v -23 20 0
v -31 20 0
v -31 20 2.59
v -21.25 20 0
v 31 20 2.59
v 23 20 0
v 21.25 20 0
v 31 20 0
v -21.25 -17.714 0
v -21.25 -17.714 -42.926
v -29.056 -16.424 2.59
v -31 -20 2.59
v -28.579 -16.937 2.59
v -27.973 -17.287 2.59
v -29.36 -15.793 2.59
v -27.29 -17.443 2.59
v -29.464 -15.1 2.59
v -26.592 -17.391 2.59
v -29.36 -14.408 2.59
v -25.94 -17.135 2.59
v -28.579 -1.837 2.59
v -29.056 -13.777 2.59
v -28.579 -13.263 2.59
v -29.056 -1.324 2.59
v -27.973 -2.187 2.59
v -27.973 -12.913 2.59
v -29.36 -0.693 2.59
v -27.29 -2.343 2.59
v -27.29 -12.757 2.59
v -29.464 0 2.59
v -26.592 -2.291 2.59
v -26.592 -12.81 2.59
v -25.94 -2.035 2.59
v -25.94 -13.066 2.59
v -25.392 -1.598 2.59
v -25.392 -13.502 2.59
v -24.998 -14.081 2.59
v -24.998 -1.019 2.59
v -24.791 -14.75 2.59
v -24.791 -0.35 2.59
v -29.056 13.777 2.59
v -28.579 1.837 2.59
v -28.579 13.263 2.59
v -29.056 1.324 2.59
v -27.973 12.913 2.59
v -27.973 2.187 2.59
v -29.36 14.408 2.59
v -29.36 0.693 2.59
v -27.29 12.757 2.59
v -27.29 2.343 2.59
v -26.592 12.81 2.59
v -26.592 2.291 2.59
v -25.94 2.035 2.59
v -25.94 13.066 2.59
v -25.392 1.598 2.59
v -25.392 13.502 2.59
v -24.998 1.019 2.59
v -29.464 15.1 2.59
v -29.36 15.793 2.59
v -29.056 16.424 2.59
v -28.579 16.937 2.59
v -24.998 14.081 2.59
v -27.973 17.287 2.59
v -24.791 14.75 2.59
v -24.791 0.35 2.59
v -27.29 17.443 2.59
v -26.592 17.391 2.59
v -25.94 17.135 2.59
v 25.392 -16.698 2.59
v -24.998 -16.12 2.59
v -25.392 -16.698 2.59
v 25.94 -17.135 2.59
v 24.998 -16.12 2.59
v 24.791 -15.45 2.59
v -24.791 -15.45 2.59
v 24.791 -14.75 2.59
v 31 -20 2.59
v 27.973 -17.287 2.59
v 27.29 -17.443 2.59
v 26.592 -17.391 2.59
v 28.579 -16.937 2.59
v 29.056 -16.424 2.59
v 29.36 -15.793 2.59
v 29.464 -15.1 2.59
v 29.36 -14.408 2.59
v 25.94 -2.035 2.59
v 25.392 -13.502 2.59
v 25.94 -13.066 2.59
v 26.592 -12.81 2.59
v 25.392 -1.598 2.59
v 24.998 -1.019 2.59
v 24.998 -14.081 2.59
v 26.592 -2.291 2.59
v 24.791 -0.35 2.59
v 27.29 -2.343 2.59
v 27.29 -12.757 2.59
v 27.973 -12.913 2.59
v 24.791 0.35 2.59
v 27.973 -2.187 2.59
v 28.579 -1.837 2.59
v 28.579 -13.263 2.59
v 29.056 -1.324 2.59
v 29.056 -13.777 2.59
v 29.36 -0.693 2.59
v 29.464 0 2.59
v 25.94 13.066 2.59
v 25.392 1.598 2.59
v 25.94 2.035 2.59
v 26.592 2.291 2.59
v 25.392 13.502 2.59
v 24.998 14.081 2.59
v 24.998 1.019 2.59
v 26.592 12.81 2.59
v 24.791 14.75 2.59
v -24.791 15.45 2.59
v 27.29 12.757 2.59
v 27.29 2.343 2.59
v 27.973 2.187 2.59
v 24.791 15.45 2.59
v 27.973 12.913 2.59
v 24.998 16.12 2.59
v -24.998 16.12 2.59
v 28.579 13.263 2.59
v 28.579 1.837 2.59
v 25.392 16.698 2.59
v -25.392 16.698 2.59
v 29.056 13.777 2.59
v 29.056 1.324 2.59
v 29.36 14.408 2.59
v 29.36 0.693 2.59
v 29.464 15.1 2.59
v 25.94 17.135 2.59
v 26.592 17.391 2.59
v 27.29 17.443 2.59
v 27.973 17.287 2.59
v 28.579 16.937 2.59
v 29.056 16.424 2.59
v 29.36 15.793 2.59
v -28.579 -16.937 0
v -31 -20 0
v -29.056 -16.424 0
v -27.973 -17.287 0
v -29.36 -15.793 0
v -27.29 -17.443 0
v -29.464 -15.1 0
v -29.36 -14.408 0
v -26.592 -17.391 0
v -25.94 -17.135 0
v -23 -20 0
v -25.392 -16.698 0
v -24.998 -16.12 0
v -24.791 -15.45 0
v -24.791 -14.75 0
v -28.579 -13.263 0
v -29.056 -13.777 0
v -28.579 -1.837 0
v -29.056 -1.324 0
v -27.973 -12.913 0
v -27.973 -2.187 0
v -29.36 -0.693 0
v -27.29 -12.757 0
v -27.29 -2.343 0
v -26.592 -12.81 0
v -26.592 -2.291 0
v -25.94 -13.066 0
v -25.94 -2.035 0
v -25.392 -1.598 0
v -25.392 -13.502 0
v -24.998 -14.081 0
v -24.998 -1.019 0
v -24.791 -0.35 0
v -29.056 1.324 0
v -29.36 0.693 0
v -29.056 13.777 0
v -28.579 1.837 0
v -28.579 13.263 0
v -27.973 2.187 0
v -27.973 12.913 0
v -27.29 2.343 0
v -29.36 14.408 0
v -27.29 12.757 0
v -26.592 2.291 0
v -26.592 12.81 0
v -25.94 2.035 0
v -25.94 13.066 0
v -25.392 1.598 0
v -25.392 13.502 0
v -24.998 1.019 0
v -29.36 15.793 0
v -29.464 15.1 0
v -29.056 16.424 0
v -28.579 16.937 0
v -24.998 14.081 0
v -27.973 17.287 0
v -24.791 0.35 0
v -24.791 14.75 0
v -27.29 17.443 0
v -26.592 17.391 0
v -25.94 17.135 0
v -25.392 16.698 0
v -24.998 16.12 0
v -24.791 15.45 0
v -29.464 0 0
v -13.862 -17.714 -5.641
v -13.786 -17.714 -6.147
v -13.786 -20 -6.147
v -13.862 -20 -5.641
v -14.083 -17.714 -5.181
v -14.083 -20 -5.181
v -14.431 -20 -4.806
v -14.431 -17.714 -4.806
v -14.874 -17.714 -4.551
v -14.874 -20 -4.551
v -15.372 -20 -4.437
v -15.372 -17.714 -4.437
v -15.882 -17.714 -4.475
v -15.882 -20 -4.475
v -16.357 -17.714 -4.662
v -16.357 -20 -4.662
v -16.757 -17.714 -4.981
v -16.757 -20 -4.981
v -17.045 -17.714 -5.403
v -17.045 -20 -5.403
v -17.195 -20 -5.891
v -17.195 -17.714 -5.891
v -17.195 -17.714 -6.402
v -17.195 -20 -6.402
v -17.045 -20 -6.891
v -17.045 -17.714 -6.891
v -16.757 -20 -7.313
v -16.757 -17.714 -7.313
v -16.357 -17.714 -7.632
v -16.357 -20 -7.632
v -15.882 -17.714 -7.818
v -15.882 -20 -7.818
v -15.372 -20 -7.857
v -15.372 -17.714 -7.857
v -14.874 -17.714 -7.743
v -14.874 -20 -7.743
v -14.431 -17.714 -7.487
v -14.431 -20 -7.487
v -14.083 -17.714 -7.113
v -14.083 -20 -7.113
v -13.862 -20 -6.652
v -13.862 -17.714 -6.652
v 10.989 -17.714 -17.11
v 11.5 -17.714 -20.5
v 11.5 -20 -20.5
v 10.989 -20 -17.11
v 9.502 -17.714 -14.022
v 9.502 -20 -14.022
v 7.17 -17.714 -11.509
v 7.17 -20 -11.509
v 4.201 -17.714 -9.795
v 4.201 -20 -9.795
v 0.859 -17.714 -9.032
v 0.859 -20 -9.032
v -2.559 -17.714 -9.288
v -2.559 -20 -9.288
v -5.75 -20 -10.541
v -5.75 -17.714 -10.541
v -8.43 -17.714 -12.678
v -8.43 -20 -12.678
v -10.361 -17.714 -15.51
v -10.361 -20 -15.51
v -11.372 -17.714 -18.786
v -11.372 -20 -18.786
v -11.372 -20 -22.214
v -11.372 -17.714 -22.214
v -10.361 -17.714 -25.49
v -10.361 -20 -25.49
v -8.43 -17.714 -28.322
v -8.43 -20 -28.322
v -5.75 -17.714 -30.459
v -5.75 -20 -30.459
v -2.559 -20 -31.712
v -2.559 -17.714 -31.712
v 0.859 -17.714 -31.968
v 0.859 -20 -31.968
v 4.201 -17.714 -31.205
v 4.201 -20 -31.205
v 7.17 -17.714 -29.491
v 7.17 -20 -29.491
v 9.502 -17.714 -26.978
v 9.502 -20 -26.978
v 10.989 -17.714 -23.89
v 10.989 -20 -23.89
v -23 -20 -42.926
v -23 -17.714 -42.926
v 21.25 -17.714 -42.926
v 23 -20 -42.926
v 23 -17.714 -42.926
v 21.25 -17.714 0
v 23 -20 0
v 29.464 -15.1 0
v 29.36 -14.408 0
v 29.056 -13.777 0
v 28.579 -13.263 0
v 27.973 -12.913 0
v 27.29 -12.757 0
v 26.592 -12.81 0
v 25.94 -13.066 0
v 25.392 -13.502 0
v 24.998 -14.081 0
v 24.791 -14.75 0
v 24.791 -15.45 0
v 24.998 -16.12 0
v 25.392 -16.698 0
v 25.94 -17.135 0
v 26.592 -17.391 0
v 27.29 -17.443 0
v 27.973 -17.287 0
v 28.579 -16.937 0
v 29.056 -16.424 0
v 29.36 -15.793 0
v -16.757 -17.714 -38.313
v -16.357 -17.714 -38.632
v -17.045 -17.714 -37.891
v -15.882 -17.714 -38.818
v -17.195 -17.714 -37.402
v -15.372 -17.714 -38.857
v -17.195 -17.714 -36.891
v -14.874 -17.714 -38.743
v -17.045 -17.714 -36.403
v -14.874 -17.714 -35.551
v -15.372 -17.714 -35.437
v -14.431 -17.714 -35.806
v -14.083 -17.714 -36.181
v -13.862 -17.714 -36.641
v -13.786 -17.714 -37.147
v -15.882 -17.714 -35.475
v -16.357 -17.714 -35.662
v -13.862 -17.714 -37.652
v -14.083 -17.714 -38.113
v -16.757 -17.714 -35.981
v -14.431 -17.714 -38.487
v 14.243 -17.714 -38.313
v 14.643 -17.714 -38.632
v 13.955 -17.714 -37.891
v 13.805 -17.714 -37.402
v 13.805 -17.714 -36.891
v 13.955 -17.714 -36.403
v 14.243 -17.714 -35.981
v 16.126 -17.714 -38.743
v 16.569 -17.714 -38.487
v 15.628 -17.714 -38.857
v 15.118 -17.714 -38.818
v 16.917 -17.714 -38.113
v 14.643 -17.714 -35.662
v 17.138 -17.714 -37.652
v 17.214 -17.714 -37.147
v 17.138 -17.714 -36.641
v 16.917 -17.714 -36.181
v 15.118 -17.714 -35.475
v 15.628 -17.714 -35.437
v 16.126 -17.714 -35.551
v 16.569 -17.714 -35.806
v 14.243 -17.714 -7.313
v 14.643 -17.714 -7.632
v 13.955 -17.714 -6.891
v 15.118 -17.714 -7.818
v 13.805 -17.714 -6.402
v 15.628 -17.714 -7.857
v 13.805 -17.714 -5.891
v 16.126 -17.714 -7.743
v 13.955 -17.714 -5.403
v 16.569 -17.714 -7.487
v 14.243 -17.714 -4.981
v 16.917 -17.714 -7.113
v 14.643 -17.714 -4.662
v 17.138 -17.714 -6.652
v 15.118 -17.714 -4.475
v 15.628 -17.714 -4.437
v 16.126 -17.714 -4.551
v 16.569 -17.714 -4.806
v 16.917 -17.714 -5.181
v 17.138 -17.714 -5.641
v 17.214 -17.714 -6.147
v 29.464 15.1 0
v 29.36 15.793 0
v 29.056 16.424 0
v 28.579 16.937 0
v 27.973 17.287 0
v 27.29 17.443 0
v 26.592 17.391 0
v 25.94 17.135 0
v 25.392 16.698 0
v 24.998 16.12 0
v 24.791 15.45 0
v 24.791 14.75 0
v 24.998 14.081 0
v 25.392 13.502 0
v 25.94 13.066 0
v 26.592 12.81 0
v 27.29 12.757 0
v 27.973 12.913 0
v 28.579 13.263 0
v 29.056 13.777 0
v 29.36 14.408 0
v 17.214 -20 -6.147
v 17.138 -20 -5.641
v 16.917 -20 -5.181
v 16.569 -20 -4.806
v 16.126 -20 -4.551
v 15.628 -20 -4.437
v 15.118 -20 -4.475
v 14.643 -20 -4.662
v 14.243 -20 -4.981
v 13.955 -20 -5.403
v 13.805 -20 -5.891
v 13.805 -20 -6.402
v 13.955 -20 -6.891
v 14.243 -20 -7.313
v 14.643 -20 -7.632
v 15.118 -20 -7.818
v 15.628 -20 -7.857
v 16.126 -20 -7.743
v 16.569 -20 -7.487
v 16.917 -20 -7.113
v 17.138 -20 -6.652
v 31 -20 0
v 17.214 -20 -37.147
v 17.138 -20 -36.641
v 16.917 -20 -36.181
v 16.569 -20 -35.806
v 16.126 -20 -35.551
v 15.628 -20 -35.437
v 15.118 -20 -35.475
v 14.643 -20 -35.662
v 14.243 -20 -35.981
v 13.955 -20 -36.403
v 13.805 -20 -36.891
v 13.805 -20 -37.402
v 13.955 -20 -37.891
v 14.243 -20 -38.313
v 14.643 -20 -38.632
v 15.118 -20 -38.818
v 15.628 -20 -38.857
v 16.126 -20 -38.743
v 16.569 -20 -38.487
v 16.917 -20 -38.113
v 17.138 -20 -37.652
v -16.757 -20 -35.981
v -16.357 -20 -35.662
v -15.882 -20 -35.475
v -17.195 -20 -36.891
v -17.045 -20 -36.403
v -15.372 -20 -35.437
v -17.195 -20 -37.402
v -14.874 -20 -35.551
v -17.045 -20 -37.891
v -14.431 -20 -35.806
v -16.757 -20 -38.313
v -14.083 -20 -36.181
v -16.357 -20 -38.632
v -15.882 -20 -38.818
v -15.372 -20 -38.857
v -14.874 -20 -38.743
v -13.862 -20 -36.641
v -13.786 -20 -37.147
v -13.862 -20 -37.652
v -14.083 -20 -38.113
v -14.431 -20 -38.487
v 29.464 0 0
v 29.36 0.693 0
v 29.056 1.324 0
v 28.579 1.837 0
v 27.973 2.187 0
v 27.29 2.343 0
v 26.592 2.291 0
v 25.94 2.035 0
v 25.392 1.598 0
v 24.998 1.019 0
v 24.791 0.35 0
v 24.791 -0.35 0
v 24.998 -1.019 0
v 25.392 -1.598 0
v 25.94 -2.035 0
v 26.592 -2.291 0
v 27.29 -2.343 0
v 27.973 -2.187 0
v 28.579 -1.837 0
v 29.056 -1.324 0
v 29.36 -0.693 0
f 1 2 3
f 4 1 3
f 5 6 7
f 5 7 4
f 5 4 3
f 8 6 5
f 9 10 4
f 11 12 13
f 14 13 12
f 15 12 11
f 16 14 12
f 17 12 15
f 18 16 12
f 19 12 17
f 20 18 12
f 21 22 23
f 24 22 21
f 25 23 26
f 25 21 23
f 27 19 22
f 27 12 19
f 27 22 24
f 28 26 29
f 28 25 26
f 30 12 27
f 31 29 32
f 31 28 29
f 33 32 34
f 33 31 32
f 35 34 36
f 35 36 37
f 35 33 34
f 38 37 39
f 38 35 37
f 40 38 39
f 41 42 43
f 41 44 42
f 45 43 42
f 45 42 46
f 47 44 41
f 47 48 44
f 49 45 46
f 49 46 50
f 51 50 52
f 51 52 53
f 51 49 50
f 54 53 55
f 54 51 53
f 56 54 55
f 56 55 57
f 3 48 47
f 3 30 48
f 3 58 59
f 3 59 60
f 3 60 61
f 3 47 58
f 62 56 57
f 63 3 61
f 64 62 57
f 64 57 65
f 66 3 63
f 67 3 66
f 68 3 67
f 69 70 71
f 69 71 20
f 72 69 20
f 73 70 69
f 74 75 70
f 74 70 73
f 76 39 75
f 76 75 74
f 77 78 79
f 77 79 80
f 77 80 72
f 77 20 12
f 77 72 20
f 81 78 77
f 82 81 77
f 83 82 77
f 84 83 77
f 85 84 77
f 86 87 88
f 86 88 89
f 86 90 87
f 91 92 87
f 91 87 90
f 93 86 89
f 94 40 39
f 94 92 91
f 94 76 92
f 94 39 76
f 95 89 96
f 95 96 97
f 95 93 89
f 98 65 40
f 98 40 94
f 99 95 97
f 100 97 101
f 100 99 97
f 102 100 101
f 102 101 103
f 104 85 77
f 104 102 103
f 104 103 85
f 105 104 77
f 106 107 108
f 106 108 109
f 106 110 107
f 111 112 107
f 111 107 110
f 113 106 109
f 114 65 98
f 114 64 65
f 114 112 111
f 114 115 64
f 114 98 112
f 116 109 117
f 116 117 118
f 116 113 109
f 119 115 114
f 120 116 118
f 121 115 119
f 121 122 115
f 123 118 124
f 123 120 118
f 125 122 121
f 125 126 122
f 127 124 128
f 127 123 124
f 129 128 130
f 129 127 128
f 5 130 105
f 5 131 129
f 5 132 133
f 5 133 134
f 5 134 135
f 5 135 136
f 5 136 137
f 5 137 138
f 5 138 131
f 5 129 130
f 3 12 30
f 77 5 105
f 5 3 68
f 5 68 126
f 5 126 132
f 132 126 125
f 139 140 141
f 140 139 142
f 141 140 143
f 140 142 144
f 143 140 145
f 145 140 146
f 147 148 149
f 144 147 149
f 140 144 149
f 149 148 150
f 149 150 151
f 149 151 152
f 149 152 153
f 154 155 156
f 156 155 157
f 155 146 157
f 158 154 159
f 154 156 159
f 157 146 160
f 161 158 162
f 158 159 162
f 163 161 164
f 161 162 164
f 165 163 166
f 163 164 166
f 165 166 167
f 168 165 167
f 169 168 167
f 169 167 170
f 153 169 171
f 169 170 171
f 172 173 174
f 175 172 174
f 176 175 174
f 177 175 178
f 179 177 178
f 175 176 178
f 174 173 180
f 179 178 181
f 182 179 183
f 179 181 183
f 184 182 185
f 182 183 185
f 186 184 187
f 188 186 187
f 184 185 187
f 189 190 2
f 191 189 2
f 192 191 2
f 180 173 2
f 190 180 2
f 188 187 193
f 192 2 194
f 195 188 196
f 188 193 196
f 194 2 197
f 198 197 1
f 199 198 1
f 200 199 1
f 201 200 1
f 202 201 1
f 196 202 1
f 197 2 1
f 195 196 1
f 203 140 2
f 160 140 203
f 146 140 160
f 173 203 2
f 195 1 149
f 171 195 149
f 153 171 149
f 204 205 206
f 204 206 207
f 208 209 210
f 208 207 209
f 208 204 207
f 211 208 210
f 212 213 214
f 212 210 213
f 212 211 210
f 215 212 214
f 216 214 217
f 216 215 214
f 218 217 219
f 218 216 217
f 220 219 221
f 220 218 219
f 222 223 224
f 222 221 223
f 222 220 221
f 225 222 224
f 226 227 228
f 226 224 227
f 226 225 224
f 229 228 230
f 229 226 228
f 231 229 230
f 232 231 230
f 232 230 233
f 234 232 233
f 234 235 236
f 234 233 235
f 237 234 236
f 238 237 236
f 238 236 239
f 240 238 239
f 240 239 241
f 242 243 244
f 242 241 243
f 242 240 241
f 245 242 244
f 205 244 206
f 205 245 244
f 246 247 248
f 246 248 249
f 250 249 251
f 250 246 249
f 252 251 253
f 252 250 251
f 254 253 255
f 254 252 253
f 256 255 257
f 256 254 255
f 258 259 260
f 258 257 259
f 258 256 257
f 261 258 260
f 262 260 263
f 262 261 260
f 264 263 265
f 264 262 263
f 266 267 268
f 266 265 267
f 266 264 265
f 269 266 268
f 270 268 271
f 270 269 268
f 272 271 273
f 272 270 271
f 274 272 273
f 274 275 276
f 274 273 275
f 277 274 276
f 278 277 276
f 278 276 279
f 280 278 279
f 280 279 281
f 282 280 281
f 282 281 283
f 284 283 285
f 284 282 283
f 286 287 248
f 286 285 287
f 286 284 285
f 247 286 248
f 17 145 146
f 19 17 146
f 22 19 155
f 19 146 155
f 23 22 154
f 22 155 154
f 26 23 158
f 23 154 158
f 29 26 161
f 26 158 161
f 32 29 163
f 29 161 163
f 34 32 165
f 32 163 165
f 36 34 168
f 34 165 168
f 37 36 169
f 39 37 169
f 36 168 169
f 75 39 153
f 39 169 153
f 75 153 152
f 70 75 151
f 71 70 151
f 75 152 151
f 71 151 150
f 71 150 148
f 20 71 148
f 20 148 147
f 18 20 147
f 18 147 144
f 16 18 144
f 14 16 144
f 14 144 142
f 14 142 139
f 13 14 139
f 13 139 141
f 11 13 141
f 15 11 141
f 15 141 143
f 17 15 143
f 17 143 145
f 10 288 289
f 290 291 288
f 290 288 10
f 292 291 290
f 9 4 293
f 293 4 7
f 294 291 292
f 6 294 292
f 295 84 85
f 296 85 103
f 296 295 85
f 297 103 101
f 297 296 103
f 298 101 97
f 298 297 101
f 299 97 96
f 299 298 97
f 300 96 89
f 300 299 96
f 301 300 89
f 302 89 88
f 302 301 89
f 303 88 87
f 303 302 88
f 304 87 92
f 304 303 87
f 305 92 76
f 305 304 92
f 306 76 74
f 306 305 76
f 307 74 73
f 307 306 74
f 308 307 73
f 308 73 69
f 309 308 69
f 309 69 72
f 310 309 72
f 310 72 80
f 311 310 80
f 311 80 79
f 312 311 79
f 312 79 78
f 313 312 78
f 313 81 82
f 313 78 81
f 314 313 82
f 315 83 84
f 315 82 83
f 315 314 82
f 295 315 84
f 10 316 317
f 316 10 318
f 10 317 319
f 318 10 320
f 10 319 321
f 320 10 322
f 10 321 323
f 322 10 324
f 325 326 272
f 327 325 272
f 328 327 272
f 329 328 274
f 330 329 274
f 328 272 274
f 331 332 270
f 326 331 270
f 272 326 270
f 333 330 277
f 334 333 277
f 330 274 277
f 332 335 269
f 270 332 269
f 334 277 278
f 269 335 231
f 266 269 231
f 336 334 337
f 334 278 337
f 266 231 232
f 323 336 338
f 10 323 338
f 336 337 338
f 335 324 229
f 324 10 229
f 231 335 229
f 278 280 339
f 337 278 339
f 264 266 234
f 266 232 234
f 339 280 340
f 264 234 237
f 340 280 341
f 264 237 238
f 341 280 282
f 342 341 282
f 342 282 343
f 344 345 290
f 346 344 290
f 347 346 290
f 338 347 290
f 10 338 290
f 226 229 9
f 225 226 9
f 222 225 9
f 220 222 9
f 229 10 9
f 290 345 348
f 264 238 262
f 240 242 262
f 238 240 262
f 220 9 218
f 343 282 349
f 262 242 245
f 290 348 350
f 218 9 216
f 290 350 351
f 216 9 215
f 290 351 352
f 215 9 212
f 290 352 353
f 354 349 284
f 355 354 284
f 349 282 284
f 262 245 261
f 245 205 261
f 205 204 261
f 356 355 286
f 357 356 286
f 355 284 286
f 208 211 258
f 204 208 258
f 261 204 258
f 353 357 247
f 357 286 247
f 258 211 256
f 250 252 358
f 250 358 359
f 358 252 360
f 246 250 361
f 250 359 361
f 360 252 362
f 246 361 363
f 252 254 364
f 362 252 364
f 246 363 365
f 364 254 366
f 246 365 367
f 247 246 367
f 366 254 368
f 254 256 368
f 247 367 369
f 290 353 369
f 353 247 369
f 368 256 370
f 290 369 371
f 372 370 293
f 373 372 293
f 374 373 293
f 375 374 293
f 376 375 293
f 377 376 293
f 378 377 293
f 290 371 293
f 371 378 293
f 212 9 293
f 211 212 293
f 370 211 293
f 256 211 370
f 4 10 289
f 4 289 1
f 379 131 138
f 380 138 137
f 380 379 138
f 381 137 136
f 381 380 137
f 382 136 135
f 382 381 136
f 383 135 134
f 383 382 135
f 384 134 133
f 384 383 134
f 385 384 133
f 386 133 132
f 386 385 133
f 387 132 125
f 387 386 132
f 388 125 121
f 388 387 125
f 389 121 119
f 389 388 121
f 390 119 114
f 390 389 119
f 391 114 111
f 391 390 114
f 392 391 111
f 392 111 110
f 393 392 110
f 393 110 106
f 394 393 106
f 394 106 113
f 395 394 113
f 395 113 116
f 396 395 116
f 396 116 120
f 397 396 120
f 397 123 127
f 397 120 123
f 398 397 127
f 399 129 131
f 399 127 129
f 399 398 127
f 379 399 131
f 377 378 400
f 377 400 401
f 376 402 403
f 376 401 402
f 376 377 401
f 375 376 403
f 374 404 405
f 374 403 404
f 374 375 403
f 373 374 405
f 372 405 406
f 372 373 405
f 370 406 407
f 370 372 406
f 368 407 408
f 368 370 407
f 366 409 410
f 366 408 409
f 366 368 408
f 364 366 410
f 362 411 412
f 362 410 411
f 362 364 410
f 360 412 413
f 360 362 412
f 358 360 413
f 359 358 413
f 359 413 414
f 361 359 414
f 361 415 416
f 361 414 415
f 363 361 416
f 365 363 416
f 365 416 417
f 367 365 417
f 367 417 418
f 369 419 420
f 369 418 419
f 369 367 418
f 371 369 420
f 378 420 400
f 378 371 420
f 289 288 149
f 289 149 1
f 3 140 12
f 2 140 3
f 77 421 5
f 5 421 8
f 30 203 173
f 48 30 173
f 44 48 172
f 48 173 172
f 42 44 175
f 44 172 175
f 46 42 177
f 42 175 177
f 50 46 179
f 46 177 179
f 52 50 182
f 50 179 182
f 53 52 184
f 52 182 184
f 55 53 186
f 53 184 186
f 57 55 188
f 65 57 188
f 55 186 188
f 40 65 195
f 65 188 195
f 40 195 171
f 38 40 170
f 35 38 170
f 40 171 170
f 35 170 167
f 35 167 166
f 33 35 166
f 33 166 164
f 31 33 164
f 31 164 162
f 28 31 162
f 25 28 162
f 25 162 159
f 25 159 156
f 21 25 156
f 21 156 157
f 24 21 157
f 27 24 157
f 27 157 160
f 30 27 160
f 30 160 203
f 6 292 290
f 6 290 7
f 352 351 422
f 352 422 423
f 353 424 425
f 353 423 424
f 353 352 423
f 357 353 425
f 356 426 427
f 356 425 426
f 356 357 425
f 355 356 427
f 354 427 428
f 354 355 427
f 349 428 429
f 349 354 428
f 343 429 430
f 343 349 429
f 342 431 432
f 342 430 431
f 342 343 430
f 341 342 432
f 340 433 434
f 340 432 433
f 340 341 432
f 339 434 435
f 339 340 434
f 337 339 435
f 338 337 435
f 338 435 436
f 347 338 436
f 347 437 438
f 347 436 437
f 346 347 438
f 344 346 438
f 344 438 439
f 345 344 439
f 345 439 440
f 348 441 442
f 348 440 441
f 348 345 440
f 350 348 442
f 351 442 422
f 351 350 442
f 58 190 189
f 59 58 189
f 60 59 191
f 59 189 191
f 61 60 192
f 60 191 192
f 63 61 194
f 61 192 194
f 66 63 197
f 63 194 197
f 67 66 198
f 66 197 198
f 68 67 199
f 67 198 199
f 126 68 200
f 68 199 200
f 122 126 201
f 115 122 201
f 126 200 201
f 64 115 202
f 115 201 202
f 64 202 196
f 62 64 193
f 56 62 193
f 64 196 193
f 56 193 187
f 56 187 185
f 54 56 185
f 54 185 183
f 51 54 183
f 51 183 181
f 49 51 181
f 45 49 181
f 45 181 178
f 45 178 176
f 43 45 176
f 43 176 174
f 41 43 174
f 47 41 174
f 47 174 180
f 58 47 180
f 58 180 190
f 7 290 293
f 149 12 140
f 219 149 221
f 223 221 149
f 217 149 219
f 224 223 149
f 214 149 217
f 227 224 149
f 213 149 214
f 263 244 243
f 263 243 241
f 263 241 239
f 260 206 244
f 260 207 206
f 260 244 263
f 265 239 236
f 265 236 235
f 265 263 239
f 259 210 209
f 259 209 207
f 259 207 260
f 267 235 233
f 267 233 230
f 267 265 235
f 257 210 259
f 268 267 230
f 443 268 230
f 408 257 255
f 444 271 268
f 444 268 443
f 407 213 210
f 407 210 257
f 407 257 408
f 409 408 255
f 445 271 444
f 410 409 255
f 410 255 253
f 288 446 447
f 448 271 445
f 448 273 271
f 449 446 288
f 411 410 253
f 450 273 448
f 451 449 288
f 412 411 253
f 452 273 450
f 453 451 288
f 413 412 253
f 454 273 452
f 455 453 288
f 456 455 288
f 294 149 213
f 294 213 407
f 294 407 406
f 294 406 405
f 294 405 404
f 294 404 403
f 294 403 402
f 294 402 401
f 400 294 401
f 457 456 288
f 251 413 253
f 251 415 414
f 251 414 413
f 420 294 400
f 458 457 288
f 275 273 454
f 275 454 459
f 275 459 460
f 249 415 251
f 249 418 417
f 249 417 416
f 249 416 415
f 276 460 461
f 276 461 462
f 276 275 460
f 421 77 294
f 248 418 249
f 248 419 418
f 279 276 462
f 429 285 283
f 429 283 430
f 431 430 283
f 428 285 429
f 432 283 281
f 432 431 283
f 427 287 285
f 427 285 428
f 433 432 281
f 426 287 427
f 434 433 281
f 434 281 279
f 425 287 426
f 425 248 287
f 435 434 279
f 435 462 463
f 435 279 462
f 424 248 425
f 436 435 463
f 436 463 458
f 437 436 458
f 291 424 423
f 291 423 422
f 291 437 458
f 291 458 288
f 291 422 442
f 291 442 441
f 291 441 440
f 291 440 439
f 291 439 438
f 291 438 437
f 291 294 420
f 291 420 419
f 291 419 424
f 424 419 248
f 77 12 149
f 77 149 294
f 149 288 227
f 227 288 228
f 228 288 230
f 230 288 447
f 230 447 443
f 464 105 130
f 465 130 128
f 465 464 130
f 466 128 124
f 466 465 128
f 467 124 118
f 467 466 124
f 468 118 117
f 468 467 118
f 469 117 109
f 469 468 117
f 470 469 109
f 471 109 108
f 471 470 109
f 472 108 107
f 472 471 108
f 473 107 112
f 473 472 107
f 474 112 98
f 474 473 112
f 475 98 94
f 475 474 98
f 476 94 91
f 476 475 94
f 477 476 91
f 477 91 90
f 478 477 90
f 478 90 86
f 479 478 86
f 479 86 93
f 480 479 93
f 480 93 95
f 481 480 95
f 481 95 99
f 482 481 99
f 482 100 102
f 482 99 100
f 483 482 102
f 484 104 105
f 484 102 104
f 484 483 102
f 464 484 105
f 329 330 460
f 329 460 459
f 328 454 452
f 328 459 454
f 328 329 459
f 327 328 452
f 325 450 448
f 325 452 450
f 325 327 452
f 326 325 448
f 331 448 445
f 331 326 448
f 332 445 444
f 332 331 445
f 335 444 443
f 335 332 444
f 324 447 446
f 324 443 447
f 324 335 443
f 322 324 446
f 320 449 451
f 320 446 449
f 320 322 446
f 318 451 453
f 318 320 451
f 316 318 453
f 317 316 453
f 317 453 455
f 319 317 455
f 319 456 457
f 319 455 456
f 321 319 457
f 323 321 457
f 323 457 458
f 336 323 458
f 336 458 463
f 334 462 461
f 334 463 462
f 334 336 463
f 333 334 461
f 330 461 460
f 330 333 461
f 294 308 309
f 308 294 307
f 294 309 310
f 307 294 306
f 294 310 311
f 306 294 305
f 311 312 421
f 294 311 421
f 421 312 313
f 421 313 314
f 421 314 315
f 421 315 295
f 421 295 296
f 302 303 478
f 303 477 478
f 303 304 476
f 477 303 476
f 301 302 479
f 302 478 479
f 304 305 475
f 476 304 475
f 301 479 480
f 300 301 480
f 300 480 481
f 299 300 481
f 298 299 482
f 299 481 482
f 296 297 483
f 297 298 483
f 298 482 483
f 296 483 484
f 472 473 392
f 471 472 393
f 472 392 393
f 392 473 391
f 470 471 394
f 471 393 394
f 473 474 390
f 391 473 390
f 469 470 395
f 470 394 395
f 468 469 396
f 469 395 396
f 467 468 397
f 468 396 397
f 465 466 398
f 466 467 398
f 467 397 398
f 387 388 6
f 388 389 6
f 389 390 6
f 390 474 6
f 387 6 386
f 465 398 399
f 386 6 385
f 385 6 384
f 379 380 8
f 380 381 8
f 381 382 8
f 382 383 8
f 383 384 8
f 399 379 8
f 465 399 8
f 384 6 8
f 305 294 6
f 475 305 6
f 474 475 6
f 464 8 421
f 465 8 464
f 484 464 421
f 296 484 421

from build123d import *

# Parameters (mm, degrees)
SKETCH_W             = 62
SKETCH_H             = 40
PAD_DEPTH            = 2.59
PAD001_DEPTH         = 23
SKETCH003_R          = 2.3495
HOLE_DEPTH           = 175.977346
SKETCH004_R          = 1.7145
HOLE001_DEPTH        = 20.001
SKETCH005_R          = 11.5
POCKET_DEPTH         = 20.001
SKETCH006_W          = 42.5
SKETCH006_H          = 100
POCKET001_DEPTH      = 100
POCKET001_DEPTH_BACK = -17.714


with BuildPart() as part:
    # Sketch → Pad (new body)
    with BuildSketch(Plane.XY):
        Rectangle(SKETCH_W, SKETCH_H)
    extrude(amount=PAD_DEPTH)

    # Sketch001 → Pad001 (join, symmetric)
    with BuildSketch(Plane.YZ):
        Polygon((-20, -42.926), (-17.714, -42.926), (20, 0), (-20, 2.59), align=None)
    extrude(amount=PAD001_DEPTH, both=True)

    # Sketch003 → Hole (cut, through all)
    with BuildSketch(Plane.XY):
        with Locations((27.1145, 15.1003)):
            Circle(SKETCH003_R)
        with Locations((27.1145, -15.1003)):
            Circle(SKETCH003_R)
        with Locations((27.1145, 0)):
            Circle(SKETCH003_R)
    hole = extrude(amount=HOLE_DEPTH, mode=Mode.SUBTRACT)

    # Mirrored001: Hole across YZ
    add(hole.mirror(Plane.YZ), mode=Mode.SUBTRACT)

    # Sketch004 → Hole001 (cut, through all)
    with BuildSketch(Plane.XZ):
        with Locations((-15.5, -6.1468)):
            Circle(SKETCH004_R)
        with Locations((-15.5, -37.1468)):
            Circle(SKETCH004_R)
        with Locations((15.5, -37.1468)):
            Circle(SKETCH004_R)
        with Locations((15.5, -6.1468)):
            Circle(SKETCH004_R)
    extrude(amount=HOLE001_DEPTH, mode=Mode.SUBTRACT)

    # Sketch005 → Pocket (cut, through all)
    with BuildSketch(Plane.XZ):
        with Locations((0, -20.5)):
            Circle(SKETCH005_R)
    extrude(amount=POCKET_DEPTH, mode=Mode.SUBTRACT)

    # Sketch006 → Pocket001 (cut, two sides)
    with BuildSketch(Plane.XZ) as pocket001_sk:
        with Locations((0, -50)):
            Rectangle(SKETCH006_W, SKETCH006_H)
    extrude(amount=-POCKET001_DEPTH, mode=Mode.SUBTRACT)
    extrude(pocket001_sk.sketch, amount=-POCKET001_DEPTH_BACK, mode=Mode.SUBTRACT)


solid = part.part
